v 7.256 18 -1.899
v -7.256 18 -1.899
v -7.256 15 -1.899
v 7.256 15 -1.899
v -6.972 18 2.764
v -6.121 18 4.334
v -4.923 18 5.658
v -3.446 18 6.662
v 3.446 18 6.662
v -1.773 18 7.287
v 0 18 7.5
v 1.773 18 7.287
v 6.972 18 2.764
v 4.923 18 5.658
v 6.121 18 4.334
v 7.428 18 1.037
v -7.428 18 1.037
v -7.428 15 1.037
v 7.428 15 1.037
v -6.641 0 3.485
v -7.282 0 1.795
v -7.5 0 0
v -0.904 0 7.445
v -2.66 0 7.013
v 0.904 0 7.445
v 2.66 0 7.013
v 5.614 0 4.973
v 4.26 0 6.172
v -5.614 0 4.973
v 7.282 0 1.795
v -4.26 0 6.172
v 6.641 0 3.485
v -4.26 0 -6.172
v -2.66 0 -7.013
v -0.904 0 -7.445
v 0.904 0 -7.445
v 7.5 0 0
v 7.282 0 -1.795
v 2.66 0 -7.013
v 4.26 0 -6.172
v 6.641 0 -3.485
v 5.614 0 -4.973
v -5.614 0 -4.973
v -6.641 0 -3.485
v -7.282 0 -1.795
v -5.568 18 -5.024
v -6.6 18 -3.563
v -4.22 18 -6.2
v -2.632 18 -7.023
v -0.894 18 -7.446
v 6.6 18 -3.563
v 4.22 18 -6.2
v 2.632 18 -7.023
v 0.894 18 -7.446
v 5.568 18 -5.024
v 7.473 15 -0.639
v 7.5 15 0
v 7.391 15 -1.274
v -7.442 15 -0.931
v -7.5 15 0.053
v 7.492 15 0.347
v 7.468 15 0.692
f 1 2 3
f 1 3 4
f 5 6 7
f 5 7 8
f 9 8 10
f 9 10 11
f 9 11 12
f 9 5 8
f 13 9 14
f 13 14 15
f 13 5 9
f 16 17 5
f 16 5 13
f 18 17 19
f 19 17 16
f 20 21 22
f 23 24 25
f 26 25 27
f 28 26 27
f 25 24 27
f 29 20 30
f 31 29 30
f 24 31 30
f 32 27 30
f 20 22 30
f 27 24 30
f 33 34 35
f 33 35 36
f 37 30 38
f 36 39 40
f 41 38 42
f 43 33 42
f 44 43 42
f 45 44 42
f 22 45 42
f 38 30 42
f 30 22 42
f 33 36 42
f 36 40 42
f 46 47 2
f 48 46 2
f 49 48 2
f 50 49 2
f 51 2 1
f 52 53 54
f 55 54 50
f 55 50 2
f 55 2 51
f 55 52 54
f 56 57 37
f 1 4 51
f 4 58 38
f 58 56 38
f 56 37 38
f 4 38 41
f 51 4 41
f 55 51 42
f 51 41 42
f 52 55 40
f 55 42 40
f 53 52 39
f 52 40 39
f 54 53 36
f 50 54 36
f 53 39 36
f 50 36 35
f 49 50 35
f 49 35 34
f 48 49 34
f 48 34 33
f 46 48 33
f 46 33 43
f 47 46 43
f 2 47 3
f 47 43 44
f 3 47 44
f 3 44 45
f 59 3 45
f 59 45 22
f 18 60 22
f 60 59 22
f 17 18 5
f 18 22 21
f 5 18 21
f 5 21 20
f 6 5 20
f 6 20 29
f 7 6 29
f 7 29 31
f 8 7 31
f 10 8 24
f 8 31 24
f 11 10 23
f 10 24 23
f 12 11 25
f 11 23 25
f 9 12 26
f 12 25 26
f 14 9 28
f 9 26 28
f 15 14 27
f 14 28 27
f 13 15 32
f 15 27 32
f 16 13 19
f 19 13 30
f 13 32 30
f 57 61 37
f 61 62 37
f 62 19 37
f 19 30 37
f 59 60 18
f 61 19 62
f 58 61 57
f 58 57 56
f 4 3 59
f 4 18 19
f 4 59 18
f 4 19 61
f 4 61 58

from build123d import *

# Parameters (mm, degrees)
SKETCH1_R           = 7.5
BOSS_EXTRUDE1_DEPTH = 18
SKETCH2_W           = 24.164210644
SKETCH2_H           = 2.935838677
CUT_EXTRUDE1_DEPTH  = 3


with BuildPart() as part:
    # Sketch1 → Boss-Extrude1 (new body)
    with BuildSketch(Plane(origin=(0, 0, 0), x_dir=(1, 0, 0), z_dir=(0, 1, 0))):
        Circle(SKETCH1_R)
    extrude(amount=BOSS_EXTRUDE1_DEPTH)

    # Sketch2 → Cut-Extrude1 (cut)
    with BuildSketch(Plane(origin=(0, 18, 0), x_dir=(1, 0, 0), z_dir=(0, 1, 0))):
        with Locations((-0.598960247, 0.431137149)):
            Rectangle(SKETCH2_W, SKETCH2_H)
    extrude(amount=-CUT_EXTRUDE1_DEPTH, mode=Mode.SUBTRACT)


solid = part.part
